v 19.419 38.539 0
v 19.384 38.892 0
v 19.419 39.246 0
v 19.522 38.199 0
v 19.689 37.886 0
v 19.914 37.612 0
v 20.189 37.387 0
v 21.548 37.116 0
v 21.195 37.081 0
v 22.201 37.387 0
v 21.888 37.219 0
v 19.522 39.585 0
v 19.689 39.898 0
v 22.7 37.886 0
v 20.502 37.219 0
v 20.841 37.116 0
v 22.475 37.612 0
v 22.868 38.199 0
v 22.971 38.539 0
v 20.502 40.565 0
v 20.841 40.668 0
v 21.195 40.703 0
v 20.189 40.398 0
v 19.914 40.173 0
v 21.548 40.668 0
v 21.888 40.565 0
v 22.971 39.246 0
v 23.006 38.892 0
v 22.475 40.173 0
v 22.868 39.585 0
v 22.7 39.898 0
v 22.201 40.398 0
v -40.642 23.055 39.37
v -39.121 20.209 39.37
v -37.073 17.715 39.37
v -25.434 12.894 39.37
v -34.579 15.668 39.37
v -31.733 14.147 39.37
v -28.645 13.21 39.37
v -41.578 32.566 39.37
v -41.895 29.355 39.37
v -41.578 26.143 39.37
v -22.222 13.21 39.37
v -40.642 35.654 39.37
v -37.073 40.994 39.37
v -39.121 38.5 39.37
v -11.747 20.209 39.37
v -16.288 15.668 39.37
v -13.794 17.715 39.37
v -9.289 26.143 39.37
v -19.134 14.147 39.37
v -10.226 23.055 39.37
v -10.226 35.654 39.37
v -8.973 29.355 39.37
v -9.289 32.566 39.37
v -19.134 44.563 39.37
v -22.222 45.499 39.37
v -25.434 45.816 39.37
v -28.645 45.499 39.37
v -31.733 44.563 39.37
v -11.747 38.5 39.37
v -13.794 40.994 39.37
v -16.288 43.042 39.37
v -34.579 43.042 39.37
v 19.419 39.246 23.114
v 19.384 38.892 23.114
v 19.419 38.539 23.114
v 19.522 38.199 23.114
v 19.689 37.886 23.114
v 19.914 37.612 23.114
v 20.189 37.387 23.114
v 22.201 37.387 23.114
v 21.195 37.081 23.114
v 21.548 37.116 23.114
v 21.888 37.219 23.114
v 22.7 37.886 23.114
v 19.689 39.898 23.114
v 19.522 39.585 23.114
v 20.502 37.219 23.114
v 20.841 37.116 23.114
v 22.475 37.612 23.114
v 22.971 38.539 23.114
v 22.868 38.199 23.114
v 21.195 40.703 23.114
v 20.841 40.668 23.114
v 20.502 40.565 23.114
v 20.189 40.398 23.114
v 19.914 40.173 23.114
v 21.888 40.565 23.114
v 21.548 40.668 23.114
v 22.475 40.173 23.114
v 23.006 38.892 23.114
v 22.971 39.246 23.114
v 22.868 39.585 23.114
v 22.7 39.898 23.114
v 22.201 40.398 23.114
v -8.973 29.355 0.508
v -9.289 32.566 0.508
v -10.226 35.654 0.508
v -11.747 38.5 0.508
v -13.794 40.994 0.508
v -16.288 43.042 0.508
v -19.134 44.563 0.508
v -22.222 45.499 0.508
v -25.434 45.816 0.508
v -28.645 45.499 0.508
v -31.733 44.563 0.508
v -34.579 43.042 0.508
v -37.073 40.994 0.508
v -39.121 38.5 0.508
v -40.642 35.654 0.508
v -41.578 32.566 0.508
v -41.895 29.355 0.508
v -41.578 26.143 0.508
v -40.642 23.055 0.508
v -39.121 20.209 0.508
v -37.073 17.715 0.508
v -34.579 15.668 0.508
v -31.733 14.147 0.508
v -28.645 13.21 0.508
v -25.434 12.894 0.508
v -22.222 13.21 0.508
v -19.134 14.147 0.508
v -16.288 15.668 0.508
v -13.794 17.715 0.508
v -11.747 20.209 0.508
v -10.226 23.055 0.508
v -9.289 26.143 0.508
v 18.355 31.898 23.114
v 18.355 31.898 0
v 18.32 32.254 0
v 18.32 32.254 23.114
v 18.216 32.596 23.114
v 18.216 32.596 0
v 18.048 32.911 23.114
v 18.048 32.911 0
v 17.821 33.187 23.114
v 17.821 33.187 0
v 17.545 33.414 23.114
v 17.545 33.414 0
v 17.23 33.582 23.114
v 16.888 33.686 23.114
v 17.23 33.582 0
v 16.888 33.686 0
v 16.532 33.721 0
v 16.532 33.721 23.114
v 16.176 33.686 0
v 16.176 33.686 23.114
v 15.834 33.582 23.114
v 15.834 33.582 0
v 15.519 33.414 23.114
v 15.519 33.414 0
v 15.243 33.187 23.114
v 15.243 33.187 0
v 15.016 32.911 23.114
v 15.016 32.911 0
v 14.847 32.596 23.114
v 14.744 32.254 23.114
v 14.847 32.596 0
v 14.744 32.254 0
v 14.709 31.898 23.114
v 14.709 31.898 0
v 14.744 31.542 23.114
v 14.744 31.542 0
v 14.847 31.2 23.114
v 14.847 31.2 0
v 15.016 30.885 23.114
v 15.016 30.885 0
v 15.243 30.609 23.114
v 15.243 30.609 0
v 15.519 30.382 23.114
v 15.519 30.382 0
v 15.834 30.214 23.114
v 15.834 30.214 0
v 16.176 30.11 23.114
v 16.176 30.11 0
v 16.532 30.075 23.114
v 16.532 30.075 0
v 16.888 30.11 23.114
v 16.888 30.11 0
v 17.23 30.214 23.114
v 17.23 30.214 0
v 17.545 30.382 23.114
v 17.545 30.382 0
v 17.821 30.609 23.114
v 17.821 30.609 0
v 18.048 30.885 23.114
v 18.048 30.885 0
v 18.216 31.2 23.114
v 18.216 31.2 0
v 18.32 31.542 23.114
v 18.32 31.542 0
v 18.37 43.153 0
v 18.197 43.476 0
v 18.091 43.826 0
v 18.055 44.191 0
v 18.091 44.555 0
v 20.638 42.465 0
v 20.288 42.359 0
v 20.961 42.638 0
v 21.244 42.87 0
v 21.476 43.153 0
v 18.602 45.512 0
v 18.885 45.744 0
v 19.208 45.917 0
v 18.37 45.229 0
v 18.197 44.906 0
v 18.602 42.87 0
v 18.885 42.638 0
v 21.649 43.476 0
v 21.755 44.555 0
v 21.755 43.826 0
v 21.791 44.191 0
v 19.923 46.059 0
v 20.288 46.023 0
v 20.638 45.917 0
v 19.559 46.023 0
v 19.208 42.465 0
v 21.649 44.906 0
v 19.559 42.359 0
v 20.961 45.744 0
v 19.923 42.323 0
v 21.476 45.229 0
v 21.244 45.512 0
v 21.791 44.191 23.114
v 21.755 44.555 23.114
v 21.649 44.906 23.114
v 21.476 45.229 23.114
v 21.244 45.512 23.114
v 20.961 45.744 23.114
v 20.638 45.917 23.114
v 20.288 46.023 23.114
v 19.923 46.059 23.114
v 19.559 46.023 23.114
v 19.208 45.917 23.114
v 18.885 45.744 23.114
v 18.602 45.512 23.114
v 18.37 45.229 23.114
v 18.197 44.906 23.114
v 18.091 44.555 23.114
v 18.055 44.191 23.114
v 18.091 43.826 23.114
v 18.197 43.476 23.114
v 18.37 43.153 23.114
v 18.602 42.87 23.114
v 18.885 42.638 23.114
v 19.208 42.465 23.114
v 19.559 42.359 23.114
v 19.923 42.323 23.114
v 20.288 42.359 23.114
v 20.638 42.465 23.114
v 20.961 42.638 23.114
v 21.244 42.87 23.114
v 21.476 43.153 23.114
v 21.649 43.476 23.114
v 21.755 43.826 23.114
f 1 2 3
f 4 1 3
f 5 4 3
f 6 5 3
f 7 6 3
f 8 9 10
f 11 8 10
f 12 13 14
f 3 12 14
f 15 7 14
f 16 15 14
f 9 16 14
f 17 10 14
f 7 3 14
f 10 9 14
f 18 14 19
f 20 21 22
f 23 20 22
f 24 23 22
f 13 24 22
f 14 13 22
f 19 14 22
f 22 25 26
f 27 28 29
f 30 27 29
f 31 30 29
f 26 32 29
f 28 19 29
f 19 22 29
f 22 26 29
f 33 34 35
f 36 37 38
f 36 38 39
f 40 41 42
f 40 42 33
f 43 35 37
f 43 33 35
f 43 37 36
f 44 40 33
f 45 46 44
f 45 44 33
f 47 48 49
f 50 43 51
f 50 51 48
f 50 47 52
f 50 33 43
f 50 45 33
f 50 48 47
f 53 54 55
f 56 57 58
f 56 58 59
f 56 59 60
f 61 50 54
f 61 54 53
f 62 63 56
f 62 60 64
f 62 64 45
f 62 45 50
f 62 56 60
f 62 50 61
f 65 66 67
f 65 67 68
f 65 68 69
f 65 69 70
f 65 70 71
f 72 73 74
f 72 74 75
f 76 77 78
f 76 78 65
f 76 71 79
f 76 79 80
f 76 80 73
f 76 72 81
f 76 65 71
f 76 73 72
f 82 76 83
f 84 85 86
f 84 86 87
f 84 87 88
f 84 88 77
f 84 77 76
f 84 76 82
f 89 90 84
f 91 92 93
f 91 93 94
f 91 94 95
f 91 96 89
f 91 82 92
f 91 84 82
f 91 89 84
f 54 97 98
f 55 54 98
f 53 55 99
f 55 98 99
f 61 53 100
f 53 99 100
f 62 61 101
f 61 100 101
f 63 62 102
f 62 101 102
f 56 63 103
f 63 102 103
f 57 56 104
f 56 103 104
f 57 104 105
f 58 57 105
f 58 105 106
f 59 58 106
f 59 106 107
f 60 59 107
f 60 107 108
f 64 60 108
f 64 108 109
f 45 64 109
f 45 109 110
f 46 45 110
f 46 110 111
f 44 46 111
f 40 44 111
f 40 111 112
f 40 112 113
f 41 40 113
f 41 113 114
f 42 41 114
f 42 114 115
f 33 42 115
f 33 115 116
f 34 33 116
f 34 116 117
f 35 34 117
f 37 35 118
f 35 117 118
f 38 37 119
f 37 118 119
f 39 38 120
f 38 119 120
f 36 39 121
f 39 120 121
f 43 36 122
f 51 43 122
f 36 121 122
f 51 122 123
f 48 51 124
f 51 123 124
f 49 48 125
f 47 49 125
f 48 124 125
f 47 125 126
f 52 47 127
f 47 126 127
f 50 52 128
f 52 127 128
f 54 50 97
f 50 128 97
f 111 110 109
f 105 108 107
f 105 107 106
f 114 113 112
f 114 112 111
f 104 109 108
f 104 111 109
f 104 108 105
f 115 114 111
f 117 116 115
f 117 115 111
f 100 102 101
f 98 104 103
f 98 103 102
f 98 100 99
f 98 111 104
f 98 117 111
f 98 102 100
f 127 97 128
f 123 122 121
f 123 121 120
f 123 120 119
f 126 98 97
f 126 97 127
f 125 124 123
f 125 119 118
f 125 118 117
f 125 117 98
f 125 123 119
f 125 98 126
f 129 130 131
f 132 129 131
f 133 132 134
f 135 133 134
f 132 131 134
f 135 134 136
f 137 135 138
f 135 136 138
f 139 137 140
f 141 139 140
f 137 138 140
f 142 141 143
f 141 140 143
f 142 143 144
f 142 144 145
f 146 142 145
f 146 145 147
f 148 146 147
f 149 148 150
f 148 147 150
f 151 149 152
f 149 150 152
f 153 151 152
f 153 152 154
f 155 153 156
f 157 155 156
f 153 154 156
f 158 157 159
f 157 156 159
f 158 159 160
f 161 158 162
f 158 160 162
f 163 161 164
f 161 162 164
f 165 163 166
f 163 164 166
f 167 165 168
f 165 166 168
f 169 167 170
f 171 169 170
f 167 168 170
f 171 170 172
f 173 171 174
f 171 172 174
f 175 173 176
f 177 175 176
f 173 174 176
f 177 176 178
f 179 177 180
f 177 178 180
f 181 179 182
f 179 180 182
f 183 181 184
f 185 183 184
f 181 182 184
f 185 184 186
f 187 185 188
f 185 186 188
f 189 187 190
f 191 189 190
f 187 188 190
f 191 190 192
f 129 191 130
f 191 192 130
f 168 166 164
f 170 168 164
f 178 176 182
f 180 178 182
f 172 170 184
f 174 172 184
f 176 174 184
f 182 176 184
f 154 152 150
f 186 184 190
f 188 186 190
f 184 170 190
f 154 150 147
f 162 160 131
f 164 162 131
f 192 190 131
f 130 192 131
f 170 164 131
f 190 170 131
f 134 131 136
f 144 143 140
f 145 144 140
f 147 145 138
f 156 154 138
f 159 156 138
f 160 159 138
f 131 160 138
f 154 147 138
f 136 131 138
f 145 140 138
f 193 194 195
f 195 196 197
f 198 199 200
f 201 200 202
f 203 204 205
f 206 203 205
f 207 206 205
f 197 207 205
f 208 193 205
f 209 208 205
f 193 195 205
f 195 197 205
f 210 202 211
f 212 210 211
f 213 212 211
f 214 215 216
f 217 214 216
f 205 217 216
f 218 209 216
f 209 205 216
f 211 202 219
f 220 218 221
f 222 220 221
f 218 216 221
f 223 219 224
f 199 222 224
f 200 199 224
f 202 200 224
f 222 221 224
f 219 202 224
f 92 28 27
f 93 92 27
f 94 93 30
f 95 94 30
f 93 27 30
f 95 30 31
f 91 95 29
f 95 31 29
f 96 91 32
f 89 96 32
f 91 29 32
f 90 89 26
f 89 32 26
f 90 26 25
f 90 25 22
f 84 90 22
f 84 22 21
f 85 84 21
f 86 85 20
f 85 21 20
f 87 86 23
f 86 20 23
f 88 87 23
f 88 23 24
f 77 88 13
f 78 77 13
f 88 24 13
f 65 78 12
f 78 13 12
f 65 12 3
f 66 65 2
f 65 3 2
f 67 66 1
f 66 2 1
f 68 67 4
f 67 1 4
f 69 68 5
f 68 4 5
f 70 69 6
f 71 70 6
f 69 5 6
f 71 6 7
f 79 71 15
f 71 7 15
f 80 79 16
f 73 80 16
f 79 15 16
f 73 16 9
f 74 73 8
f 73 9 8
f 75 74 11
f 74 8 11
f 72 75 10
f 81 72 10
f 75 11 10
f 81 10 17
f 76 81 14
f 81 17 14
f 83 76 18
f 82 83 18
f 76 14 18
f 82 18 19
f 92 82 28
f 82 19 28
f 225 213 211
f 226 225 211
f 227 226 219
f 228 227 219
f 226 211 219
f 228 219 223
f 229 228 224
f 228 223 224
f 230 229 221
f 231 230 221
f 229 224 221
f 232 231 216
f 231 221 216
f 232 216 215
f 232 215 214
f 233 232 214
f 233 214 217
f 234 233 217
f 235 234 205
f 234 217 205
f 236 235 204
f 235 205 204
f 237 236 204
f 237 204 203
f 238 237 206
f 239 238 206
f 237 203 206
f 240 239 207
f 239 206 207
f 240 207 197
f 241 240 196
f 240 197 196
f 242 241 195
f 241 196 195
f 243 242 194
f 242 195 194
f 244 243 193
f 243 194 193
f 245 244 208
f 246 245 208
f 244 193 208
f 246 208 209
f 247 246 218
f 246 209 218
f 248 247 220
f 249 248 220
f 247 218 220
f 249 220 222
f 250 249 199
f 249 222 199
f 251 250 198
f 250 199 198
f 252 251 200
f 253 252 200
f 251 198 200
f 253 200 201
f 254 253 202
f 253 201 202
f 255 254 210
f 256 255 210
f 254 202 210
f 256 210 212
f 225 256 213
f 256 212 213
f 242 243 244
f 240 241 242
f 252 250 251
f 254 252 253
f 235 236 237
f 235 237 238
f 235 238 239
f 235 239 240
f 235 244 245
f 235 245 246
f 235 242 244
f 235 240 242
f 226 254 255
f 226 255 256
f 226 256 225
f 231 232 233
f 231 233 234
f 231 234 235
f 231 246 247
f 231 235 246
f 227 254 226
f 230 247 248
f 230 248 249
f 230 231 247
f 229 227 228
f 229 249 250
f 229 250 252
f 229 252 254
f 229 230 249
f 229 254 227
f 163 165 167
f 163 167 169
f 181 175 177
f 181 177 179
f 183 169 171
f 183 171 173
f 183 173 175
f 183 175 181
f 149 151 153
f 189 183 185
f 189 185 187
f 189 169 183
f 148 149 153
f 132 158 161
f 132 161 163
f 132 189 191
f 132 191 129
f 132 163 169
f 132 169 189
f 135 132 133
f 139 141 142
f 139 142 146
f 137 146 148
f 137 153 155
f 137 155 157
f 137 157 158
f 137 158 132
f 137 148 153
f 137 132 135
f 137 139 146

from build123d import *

# Parameters (mm, degrees)
F0_R      = 16.461068
F1_DEPTH  = 39.37
F1_FACE_R = 16.461068
F2_DEPTH  = 0.508
F3_R      = 1.82324
F3_R_2    = 1.810876
F3_R_3    = 1.868311
F4_DEPTH  = 23.114


with BuildPart() as f1:
    # F0 (on Top) → F1 (new body)
    with BuildSketch(Plane.XY):
        with Locations((-25.433643, 29.354664)):
            Circle(F0_R)
    extrude(amount=F1_DEPTH)

    # F1_face (on face) → F2 (cut)
    with BuildSketch(Plane(origin=(-25.433643, 29.354664, 0), x_dir=(1, 0, 0), z_dir=(0, 0, -1))):
        Circle(F1_FACE_R)
    extrude(amount=-F2_DEPTH, mode=Mode.SUBTRACT)


with BuildPart() as f4:
    # F3 (on Top) → F4 (new body)
    with BuildSketch(Plane.XY):
        with Locations((16.531866, 31.898025)):
            Circle(F3_R)
        with Locations((21.194704, 38.89228)):
            Circle(F3_R_2)
        with Locations((19.923018, 44.190951)):
            Circle(F3_R_3)
    extrude(amount=F4_DEPTH)


solid = Compound([f1.part, f4.part])
